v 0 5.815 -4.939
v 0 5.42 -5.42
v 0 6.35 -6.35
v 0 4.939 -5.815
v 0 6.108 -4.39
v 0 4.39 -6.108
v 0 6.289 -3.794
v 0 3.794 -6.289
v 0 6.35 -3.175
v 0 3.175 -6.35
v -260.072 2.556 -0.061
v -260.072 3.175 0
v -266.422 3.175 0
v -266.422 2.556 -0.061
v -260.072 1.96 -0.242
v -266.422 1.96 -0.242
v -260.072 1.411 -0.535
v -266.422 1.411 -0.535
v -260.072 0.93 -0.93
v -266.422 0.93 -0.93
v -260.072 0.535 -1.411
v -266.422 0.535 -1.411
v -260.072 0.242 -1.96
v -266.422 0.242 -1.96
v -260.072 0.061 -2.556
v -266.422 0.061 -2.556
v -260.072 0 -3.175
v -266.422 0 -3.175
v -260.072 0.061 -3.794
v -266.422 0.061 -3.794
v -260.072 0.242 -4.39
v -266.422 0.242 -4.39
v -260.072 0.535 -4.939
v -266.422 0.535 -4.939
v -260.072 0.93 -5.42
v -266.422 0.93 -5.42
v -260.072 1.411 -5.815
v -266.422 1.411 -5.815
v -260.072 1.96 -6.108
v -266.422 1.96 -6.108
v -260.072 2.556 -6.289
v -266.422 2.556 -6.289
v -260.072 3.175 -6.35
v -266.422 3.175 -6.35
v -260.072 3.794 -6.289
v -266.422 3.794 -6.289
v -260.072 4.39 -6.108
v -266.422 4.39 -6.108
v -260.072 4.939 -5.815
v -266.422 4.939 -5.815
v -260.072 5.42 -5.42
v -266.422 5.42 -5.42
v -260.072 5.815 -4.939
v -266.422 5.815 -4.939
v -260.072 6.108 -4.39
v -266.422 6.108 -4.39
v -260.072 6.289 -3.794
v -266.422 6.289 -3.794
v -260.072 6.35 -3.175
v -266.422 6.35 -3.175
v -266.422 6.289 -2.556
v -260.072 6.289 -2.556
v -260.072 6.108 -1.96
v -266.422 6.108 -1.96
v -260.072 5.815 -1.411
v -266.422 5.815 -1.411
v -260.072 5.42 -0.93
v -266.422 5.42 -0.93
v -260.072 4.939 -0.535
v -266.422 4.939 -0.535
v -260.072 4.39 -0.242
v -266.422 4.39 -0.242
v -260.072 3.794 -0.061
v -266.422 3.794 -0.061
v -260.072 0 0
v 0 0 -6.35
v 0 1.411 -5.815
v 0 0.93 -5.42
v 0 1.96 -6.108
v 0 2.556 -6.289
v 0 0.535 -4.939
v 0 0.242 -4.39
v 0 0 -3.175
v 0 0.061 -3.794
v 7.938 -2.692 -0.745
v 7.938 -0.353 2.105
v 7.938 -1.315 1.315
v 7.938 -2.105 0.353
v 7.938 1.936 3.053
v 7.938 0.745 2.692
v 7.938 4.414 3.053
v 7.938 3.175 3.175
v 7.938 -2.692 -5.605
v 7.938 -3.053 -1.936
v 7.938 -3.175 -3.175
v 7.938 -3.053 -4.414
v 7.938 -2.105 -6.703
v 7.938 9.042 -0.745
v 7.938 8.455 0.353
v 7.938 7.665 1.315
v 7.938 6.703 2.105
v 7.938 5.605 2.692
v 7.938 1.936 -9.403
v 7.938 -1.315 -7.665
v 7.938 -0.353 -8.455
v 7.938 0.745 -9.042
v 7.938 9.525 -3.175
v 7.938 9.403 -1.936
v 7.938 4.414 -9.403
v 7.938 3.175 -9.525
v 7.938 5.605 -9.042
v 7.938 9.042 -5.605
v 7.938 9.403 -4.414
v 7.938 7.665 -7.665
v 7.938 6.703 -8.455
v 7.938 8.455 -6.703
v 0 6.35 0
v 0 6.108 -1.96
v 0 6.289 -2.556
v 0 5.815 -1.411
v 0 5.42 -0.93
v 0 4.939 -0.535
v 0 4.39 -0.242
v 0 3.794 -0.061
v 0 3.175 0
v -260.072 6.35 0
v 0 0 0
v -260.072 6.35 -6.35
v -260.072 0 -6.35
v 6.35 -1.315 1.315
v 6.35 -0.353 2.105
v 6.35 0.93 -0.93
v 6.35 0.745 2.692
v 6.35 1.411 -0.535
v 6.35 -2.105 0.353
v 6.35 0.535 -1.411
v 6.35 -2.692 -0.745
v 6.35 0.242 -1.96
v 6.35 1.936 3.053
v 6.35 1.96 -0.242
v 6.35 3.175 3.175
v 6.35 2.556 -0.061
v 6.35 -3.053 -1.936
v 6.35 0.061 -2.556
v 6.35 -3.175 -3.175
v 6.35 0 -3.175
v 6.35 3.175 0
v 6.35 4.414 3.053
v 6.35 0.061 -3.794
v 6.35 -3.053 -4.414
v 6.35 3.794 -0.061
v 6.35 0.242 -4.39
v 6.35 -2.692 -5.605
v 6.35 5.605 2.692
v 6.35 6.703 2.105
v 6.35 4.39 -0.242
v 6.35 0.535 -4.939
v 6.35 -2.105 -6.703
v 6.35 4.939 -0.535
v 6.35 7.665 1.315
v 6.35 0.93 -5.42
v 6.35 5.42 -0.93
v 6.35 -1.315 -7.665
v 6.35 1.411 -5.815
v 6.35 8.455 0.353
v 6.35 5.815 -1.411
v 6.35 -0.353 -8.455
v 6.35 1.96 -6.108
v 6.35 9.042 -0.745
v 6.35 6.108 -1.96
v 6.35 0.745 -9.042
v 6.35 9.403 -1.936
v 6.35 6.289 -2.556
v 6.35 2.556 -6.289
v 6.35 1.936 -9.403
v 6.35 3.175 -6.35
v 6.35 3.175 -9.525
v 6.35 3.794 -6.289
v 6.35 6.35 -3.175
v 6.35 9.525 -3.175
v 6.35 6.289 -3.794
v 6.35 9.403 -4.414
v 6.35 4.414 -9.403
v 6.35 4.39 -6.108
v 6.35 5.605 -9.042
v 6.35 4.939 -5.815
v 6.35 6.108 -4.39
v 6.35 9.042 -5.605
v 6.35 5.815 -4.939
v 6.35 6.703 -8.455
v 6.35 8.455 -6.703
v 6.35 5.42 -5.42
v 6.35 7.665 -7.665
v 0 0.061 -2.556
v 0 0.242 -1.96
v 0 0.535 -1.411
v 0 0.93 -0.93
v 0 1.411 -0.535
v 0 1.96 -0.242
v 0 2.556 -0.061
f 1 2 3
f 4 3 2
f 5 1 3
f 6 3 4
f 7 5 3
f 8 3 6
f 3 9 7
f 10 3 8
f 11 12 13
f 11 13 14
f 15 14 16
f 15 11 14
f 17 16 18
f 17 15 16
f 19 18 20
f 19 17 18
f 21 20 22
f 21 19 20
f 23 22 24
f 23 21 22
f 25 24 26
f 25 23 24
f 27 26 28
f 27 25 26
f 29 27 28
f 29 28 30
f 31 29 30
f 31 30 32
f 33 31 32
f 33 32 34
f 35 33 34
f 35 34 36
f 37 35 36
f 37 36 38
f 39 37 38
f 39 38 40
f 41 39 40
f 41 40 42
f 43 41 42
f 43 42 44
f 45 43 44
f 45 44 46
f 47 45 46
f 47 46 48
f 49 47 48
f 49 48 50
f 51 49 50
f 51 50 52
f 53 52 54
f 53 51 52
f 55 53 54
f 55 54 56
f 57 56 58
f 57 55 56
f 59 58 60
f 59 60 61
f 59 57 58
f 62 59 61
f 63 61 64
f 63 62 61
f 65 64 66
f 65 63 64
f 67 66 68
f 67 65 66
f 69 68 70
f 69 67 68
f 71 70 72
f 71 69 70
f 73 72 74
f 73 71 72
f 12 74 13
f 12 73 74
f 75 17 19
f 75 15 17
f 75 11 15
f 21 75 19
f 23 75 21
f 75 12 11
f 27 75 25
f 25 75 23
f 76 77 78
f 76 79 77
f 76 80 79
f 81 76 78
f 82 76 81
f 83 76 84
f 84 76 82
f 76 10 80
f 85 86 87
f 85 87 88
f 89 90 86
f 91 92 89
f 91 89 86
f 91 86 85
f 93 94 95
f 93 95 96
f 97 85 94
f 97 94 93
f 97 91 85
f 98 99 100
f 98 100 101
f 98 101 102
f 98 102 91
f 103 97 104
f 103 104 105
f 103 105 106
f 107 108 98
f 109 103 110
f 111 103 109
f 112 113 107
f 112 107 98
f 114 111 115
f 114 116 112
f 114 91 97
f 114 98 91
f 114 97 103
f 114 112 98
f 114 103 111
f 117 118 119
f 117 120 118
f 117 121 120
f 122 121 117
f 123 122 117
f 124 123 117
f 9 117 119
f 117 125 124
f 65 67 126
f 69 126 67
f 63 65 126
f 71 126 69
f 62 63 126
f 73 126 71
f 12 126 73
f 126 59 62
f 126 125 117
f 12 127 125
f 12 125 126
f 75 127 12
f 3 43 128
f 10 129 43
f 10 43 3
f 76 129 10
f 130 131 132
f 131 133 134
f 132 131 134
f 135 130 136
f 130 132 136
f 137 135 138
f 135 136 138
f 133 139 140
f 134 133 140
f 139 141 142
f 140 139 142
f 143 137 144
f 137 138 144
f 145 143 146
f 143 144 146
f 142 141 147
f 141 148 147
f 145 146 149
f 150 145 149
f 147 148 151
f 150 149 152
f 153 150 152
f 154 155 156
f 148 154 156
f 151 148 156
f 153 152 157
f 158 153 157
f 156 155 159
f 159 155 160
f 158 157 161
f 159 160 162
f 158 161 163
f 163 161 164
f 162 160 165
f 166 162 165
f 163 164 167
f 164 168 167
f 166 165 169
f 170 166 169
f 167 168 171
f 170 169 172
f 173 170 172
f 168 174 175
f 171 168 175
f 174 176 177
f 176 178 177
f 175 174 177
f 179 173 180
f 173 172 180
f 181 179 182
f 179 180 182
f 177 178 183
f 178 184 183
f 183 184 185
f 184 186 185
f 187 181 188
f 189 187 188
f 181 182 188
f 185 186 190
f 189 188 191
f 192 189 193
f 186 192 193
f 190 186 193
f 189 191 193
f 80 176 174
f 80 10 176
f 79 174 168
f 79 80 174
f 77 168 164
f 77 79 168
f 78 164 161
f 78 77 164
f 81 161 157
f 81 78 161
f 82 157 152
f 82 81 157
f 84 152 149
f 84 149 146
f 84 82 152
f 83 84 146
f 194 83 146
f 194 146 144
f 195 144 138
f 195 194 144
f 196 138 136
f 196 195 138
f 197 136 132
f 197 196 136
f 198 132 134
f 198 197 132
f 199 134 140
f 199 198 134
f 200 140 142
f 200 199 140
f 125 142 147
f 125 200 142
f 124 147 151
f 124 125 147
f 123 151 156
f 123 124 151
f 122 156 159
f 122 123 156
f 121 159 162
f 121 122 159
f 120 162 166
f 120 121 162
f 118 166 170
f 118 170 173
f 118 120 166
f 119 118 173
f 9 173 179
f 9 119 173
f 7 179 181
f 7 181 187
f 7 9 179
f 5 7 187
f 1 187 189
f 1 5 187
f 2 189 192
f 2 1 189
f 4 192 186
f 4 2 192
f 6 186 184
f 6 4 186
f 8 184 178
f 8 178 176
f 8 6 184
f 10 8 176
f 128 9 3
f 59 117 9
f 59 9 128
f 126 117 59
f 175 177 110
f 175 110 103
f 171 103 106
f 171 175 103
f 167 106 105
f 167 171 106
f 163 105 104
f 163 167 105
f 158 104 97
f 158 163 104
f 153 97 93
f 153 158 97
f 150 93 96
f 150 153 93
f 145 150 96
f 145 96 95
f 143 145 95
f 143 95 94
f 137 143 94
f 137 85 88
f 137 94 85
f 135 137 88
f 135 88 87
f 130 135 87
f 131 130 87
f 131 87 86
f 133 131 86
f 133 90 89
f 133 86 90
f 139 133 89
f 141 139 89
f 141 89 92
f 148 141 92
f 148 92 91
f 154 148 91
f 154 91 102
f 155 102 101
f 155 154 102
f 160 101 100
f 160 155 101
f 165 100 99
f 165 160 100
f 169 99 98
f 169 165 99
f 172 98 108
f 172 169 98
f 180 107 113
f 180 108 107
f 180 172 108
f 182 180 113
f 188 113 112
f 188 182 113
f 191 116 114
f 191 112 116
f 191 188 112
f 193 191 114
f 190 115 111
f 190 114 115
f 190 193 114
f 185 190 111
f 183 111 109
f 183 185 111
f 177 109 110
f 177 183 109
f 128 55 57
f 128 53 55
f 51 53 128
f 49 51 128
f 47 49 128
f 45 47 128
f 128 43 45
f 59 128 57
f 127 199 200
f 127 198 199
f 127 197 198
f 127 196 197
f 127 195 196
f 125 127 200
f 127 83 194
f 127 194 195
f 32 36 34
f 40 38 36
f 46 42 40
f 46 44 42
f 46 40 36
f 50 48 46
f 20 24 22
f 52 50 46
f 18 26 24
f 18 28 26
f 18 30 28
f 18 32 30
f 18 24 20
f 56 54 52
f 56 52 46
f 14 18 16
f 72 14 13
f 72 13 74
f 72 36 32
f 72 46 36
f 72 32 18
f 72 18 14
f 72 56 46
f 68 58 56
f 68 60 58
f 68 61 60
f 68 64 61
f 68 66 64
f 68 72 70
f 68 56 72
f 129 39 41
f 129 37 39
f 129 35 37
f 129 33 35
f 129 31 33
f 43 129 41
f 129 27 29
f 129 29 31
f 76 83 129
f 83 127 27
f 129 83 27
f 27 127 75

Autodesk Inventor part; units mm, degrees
ref_plane "YZ Plane" through (0, 0, 0) normal (1, 0, 0) x (0, 1, 0)
ref_plane "XZ Plane" through (0, 0, 0) normal (0, 1, 0) x (-1, 0, 0)
ref_plane "XY Plane" through (0, 0, 0) normal (0, 0, 1) x (1, 0, 0)
sketch "Sketch1" plane through (0, 0, 0) normal (0, 1, 0) x (-1, 0, 0)
  line L0 (0, 0) -> (260.0718, 0)
  line L1 (260.0718, 0) -> (260.0718, -6.35)
  line L2 (260.0718, -6.35) -> (0, -6.35)
  line L3 (0, -6.35) -> (0, 0)
  dimension "d0" = 260.0718
  dimension "d1" = 6.35
extrude "Extrusion1" add sketch "Sketch1" along normal blind 6.35
sketch "Sketch2" plane through (-260.0718, 0, -6.35) normal (-1, 0, 0) x (0, 0, 1)
  line L0 (6.35, 6.35) -> (0, 6.35) projected
  line L1 (6.35, 0) -> (6.35, 6.35) projected
  circle A0 centre (3.175, 3.175) radius 3.175
  dimension "d4" = 3.175
  dimension "d5" = 3.175
  dimension "d6" = 6.35
extrude "Extrusion2" add sketch "Sketch2" along normal blind 6.35 contours A0
sketch "Sketch3" plane through (0, 0, 0) normal (1, 0, 0) x (0, 0, -1)
  line L0 (0, 6.35) -> (6.35, 6.35) projected
  line L1 (6.35, 0) -> (6.35, 6.35) projected
  circle A0 centre (3.175, 3.175) radius 3.175
  point P0 (0, 0)
  dimension "d9" = 3.175
  dimension "d10" = 3.175
  dimension "d11" = 6.35
extrude "Extrusion3" add sketch "Sketch3" along normal blind 6.35 contours A0
sketch "Sketch4" plane through (6.35, 3.175, -3.175) normal (1, 0, 0) x (0, 0, -1)
  circle A0 centre (0, 0) radius 6.35
  point P0 (-3.175, -3.175)
  dimension "d14" = 12.7
extrude "Extrusion4" add sketch "Sketch4" along normal blind 1.5875
equation "\"d0\" = -6 * SpWall + IBDia"
equation "\"d1\" = AxelDia"
equation "\"d2\" = AxelDia"
equation "\"d4\" = 0.5 * AxelDia"
equation "\"d5\" = 0.5 * AxelDia"
equation "\"d6\" = AxelDia"
equation "\"d7\" = 2 * SpWall"
equation "\"d9\" = 0.5 * AxelDia"
equation "\"d10\" = 0.5 * AxelDia"
equation "\"d11\" = AxelDia"
equation "\"d12\" = 2 * SpWall"
equation "\"d15\" = Wall"
equation "\"SpWall\" = 3.175"
equation "\"IBDia\" = 279.121792"
equation "\"AxelDia\" = 6.35"
equation "\"Wall\" = 1.5875"
properties part number "MotorMntPart"
